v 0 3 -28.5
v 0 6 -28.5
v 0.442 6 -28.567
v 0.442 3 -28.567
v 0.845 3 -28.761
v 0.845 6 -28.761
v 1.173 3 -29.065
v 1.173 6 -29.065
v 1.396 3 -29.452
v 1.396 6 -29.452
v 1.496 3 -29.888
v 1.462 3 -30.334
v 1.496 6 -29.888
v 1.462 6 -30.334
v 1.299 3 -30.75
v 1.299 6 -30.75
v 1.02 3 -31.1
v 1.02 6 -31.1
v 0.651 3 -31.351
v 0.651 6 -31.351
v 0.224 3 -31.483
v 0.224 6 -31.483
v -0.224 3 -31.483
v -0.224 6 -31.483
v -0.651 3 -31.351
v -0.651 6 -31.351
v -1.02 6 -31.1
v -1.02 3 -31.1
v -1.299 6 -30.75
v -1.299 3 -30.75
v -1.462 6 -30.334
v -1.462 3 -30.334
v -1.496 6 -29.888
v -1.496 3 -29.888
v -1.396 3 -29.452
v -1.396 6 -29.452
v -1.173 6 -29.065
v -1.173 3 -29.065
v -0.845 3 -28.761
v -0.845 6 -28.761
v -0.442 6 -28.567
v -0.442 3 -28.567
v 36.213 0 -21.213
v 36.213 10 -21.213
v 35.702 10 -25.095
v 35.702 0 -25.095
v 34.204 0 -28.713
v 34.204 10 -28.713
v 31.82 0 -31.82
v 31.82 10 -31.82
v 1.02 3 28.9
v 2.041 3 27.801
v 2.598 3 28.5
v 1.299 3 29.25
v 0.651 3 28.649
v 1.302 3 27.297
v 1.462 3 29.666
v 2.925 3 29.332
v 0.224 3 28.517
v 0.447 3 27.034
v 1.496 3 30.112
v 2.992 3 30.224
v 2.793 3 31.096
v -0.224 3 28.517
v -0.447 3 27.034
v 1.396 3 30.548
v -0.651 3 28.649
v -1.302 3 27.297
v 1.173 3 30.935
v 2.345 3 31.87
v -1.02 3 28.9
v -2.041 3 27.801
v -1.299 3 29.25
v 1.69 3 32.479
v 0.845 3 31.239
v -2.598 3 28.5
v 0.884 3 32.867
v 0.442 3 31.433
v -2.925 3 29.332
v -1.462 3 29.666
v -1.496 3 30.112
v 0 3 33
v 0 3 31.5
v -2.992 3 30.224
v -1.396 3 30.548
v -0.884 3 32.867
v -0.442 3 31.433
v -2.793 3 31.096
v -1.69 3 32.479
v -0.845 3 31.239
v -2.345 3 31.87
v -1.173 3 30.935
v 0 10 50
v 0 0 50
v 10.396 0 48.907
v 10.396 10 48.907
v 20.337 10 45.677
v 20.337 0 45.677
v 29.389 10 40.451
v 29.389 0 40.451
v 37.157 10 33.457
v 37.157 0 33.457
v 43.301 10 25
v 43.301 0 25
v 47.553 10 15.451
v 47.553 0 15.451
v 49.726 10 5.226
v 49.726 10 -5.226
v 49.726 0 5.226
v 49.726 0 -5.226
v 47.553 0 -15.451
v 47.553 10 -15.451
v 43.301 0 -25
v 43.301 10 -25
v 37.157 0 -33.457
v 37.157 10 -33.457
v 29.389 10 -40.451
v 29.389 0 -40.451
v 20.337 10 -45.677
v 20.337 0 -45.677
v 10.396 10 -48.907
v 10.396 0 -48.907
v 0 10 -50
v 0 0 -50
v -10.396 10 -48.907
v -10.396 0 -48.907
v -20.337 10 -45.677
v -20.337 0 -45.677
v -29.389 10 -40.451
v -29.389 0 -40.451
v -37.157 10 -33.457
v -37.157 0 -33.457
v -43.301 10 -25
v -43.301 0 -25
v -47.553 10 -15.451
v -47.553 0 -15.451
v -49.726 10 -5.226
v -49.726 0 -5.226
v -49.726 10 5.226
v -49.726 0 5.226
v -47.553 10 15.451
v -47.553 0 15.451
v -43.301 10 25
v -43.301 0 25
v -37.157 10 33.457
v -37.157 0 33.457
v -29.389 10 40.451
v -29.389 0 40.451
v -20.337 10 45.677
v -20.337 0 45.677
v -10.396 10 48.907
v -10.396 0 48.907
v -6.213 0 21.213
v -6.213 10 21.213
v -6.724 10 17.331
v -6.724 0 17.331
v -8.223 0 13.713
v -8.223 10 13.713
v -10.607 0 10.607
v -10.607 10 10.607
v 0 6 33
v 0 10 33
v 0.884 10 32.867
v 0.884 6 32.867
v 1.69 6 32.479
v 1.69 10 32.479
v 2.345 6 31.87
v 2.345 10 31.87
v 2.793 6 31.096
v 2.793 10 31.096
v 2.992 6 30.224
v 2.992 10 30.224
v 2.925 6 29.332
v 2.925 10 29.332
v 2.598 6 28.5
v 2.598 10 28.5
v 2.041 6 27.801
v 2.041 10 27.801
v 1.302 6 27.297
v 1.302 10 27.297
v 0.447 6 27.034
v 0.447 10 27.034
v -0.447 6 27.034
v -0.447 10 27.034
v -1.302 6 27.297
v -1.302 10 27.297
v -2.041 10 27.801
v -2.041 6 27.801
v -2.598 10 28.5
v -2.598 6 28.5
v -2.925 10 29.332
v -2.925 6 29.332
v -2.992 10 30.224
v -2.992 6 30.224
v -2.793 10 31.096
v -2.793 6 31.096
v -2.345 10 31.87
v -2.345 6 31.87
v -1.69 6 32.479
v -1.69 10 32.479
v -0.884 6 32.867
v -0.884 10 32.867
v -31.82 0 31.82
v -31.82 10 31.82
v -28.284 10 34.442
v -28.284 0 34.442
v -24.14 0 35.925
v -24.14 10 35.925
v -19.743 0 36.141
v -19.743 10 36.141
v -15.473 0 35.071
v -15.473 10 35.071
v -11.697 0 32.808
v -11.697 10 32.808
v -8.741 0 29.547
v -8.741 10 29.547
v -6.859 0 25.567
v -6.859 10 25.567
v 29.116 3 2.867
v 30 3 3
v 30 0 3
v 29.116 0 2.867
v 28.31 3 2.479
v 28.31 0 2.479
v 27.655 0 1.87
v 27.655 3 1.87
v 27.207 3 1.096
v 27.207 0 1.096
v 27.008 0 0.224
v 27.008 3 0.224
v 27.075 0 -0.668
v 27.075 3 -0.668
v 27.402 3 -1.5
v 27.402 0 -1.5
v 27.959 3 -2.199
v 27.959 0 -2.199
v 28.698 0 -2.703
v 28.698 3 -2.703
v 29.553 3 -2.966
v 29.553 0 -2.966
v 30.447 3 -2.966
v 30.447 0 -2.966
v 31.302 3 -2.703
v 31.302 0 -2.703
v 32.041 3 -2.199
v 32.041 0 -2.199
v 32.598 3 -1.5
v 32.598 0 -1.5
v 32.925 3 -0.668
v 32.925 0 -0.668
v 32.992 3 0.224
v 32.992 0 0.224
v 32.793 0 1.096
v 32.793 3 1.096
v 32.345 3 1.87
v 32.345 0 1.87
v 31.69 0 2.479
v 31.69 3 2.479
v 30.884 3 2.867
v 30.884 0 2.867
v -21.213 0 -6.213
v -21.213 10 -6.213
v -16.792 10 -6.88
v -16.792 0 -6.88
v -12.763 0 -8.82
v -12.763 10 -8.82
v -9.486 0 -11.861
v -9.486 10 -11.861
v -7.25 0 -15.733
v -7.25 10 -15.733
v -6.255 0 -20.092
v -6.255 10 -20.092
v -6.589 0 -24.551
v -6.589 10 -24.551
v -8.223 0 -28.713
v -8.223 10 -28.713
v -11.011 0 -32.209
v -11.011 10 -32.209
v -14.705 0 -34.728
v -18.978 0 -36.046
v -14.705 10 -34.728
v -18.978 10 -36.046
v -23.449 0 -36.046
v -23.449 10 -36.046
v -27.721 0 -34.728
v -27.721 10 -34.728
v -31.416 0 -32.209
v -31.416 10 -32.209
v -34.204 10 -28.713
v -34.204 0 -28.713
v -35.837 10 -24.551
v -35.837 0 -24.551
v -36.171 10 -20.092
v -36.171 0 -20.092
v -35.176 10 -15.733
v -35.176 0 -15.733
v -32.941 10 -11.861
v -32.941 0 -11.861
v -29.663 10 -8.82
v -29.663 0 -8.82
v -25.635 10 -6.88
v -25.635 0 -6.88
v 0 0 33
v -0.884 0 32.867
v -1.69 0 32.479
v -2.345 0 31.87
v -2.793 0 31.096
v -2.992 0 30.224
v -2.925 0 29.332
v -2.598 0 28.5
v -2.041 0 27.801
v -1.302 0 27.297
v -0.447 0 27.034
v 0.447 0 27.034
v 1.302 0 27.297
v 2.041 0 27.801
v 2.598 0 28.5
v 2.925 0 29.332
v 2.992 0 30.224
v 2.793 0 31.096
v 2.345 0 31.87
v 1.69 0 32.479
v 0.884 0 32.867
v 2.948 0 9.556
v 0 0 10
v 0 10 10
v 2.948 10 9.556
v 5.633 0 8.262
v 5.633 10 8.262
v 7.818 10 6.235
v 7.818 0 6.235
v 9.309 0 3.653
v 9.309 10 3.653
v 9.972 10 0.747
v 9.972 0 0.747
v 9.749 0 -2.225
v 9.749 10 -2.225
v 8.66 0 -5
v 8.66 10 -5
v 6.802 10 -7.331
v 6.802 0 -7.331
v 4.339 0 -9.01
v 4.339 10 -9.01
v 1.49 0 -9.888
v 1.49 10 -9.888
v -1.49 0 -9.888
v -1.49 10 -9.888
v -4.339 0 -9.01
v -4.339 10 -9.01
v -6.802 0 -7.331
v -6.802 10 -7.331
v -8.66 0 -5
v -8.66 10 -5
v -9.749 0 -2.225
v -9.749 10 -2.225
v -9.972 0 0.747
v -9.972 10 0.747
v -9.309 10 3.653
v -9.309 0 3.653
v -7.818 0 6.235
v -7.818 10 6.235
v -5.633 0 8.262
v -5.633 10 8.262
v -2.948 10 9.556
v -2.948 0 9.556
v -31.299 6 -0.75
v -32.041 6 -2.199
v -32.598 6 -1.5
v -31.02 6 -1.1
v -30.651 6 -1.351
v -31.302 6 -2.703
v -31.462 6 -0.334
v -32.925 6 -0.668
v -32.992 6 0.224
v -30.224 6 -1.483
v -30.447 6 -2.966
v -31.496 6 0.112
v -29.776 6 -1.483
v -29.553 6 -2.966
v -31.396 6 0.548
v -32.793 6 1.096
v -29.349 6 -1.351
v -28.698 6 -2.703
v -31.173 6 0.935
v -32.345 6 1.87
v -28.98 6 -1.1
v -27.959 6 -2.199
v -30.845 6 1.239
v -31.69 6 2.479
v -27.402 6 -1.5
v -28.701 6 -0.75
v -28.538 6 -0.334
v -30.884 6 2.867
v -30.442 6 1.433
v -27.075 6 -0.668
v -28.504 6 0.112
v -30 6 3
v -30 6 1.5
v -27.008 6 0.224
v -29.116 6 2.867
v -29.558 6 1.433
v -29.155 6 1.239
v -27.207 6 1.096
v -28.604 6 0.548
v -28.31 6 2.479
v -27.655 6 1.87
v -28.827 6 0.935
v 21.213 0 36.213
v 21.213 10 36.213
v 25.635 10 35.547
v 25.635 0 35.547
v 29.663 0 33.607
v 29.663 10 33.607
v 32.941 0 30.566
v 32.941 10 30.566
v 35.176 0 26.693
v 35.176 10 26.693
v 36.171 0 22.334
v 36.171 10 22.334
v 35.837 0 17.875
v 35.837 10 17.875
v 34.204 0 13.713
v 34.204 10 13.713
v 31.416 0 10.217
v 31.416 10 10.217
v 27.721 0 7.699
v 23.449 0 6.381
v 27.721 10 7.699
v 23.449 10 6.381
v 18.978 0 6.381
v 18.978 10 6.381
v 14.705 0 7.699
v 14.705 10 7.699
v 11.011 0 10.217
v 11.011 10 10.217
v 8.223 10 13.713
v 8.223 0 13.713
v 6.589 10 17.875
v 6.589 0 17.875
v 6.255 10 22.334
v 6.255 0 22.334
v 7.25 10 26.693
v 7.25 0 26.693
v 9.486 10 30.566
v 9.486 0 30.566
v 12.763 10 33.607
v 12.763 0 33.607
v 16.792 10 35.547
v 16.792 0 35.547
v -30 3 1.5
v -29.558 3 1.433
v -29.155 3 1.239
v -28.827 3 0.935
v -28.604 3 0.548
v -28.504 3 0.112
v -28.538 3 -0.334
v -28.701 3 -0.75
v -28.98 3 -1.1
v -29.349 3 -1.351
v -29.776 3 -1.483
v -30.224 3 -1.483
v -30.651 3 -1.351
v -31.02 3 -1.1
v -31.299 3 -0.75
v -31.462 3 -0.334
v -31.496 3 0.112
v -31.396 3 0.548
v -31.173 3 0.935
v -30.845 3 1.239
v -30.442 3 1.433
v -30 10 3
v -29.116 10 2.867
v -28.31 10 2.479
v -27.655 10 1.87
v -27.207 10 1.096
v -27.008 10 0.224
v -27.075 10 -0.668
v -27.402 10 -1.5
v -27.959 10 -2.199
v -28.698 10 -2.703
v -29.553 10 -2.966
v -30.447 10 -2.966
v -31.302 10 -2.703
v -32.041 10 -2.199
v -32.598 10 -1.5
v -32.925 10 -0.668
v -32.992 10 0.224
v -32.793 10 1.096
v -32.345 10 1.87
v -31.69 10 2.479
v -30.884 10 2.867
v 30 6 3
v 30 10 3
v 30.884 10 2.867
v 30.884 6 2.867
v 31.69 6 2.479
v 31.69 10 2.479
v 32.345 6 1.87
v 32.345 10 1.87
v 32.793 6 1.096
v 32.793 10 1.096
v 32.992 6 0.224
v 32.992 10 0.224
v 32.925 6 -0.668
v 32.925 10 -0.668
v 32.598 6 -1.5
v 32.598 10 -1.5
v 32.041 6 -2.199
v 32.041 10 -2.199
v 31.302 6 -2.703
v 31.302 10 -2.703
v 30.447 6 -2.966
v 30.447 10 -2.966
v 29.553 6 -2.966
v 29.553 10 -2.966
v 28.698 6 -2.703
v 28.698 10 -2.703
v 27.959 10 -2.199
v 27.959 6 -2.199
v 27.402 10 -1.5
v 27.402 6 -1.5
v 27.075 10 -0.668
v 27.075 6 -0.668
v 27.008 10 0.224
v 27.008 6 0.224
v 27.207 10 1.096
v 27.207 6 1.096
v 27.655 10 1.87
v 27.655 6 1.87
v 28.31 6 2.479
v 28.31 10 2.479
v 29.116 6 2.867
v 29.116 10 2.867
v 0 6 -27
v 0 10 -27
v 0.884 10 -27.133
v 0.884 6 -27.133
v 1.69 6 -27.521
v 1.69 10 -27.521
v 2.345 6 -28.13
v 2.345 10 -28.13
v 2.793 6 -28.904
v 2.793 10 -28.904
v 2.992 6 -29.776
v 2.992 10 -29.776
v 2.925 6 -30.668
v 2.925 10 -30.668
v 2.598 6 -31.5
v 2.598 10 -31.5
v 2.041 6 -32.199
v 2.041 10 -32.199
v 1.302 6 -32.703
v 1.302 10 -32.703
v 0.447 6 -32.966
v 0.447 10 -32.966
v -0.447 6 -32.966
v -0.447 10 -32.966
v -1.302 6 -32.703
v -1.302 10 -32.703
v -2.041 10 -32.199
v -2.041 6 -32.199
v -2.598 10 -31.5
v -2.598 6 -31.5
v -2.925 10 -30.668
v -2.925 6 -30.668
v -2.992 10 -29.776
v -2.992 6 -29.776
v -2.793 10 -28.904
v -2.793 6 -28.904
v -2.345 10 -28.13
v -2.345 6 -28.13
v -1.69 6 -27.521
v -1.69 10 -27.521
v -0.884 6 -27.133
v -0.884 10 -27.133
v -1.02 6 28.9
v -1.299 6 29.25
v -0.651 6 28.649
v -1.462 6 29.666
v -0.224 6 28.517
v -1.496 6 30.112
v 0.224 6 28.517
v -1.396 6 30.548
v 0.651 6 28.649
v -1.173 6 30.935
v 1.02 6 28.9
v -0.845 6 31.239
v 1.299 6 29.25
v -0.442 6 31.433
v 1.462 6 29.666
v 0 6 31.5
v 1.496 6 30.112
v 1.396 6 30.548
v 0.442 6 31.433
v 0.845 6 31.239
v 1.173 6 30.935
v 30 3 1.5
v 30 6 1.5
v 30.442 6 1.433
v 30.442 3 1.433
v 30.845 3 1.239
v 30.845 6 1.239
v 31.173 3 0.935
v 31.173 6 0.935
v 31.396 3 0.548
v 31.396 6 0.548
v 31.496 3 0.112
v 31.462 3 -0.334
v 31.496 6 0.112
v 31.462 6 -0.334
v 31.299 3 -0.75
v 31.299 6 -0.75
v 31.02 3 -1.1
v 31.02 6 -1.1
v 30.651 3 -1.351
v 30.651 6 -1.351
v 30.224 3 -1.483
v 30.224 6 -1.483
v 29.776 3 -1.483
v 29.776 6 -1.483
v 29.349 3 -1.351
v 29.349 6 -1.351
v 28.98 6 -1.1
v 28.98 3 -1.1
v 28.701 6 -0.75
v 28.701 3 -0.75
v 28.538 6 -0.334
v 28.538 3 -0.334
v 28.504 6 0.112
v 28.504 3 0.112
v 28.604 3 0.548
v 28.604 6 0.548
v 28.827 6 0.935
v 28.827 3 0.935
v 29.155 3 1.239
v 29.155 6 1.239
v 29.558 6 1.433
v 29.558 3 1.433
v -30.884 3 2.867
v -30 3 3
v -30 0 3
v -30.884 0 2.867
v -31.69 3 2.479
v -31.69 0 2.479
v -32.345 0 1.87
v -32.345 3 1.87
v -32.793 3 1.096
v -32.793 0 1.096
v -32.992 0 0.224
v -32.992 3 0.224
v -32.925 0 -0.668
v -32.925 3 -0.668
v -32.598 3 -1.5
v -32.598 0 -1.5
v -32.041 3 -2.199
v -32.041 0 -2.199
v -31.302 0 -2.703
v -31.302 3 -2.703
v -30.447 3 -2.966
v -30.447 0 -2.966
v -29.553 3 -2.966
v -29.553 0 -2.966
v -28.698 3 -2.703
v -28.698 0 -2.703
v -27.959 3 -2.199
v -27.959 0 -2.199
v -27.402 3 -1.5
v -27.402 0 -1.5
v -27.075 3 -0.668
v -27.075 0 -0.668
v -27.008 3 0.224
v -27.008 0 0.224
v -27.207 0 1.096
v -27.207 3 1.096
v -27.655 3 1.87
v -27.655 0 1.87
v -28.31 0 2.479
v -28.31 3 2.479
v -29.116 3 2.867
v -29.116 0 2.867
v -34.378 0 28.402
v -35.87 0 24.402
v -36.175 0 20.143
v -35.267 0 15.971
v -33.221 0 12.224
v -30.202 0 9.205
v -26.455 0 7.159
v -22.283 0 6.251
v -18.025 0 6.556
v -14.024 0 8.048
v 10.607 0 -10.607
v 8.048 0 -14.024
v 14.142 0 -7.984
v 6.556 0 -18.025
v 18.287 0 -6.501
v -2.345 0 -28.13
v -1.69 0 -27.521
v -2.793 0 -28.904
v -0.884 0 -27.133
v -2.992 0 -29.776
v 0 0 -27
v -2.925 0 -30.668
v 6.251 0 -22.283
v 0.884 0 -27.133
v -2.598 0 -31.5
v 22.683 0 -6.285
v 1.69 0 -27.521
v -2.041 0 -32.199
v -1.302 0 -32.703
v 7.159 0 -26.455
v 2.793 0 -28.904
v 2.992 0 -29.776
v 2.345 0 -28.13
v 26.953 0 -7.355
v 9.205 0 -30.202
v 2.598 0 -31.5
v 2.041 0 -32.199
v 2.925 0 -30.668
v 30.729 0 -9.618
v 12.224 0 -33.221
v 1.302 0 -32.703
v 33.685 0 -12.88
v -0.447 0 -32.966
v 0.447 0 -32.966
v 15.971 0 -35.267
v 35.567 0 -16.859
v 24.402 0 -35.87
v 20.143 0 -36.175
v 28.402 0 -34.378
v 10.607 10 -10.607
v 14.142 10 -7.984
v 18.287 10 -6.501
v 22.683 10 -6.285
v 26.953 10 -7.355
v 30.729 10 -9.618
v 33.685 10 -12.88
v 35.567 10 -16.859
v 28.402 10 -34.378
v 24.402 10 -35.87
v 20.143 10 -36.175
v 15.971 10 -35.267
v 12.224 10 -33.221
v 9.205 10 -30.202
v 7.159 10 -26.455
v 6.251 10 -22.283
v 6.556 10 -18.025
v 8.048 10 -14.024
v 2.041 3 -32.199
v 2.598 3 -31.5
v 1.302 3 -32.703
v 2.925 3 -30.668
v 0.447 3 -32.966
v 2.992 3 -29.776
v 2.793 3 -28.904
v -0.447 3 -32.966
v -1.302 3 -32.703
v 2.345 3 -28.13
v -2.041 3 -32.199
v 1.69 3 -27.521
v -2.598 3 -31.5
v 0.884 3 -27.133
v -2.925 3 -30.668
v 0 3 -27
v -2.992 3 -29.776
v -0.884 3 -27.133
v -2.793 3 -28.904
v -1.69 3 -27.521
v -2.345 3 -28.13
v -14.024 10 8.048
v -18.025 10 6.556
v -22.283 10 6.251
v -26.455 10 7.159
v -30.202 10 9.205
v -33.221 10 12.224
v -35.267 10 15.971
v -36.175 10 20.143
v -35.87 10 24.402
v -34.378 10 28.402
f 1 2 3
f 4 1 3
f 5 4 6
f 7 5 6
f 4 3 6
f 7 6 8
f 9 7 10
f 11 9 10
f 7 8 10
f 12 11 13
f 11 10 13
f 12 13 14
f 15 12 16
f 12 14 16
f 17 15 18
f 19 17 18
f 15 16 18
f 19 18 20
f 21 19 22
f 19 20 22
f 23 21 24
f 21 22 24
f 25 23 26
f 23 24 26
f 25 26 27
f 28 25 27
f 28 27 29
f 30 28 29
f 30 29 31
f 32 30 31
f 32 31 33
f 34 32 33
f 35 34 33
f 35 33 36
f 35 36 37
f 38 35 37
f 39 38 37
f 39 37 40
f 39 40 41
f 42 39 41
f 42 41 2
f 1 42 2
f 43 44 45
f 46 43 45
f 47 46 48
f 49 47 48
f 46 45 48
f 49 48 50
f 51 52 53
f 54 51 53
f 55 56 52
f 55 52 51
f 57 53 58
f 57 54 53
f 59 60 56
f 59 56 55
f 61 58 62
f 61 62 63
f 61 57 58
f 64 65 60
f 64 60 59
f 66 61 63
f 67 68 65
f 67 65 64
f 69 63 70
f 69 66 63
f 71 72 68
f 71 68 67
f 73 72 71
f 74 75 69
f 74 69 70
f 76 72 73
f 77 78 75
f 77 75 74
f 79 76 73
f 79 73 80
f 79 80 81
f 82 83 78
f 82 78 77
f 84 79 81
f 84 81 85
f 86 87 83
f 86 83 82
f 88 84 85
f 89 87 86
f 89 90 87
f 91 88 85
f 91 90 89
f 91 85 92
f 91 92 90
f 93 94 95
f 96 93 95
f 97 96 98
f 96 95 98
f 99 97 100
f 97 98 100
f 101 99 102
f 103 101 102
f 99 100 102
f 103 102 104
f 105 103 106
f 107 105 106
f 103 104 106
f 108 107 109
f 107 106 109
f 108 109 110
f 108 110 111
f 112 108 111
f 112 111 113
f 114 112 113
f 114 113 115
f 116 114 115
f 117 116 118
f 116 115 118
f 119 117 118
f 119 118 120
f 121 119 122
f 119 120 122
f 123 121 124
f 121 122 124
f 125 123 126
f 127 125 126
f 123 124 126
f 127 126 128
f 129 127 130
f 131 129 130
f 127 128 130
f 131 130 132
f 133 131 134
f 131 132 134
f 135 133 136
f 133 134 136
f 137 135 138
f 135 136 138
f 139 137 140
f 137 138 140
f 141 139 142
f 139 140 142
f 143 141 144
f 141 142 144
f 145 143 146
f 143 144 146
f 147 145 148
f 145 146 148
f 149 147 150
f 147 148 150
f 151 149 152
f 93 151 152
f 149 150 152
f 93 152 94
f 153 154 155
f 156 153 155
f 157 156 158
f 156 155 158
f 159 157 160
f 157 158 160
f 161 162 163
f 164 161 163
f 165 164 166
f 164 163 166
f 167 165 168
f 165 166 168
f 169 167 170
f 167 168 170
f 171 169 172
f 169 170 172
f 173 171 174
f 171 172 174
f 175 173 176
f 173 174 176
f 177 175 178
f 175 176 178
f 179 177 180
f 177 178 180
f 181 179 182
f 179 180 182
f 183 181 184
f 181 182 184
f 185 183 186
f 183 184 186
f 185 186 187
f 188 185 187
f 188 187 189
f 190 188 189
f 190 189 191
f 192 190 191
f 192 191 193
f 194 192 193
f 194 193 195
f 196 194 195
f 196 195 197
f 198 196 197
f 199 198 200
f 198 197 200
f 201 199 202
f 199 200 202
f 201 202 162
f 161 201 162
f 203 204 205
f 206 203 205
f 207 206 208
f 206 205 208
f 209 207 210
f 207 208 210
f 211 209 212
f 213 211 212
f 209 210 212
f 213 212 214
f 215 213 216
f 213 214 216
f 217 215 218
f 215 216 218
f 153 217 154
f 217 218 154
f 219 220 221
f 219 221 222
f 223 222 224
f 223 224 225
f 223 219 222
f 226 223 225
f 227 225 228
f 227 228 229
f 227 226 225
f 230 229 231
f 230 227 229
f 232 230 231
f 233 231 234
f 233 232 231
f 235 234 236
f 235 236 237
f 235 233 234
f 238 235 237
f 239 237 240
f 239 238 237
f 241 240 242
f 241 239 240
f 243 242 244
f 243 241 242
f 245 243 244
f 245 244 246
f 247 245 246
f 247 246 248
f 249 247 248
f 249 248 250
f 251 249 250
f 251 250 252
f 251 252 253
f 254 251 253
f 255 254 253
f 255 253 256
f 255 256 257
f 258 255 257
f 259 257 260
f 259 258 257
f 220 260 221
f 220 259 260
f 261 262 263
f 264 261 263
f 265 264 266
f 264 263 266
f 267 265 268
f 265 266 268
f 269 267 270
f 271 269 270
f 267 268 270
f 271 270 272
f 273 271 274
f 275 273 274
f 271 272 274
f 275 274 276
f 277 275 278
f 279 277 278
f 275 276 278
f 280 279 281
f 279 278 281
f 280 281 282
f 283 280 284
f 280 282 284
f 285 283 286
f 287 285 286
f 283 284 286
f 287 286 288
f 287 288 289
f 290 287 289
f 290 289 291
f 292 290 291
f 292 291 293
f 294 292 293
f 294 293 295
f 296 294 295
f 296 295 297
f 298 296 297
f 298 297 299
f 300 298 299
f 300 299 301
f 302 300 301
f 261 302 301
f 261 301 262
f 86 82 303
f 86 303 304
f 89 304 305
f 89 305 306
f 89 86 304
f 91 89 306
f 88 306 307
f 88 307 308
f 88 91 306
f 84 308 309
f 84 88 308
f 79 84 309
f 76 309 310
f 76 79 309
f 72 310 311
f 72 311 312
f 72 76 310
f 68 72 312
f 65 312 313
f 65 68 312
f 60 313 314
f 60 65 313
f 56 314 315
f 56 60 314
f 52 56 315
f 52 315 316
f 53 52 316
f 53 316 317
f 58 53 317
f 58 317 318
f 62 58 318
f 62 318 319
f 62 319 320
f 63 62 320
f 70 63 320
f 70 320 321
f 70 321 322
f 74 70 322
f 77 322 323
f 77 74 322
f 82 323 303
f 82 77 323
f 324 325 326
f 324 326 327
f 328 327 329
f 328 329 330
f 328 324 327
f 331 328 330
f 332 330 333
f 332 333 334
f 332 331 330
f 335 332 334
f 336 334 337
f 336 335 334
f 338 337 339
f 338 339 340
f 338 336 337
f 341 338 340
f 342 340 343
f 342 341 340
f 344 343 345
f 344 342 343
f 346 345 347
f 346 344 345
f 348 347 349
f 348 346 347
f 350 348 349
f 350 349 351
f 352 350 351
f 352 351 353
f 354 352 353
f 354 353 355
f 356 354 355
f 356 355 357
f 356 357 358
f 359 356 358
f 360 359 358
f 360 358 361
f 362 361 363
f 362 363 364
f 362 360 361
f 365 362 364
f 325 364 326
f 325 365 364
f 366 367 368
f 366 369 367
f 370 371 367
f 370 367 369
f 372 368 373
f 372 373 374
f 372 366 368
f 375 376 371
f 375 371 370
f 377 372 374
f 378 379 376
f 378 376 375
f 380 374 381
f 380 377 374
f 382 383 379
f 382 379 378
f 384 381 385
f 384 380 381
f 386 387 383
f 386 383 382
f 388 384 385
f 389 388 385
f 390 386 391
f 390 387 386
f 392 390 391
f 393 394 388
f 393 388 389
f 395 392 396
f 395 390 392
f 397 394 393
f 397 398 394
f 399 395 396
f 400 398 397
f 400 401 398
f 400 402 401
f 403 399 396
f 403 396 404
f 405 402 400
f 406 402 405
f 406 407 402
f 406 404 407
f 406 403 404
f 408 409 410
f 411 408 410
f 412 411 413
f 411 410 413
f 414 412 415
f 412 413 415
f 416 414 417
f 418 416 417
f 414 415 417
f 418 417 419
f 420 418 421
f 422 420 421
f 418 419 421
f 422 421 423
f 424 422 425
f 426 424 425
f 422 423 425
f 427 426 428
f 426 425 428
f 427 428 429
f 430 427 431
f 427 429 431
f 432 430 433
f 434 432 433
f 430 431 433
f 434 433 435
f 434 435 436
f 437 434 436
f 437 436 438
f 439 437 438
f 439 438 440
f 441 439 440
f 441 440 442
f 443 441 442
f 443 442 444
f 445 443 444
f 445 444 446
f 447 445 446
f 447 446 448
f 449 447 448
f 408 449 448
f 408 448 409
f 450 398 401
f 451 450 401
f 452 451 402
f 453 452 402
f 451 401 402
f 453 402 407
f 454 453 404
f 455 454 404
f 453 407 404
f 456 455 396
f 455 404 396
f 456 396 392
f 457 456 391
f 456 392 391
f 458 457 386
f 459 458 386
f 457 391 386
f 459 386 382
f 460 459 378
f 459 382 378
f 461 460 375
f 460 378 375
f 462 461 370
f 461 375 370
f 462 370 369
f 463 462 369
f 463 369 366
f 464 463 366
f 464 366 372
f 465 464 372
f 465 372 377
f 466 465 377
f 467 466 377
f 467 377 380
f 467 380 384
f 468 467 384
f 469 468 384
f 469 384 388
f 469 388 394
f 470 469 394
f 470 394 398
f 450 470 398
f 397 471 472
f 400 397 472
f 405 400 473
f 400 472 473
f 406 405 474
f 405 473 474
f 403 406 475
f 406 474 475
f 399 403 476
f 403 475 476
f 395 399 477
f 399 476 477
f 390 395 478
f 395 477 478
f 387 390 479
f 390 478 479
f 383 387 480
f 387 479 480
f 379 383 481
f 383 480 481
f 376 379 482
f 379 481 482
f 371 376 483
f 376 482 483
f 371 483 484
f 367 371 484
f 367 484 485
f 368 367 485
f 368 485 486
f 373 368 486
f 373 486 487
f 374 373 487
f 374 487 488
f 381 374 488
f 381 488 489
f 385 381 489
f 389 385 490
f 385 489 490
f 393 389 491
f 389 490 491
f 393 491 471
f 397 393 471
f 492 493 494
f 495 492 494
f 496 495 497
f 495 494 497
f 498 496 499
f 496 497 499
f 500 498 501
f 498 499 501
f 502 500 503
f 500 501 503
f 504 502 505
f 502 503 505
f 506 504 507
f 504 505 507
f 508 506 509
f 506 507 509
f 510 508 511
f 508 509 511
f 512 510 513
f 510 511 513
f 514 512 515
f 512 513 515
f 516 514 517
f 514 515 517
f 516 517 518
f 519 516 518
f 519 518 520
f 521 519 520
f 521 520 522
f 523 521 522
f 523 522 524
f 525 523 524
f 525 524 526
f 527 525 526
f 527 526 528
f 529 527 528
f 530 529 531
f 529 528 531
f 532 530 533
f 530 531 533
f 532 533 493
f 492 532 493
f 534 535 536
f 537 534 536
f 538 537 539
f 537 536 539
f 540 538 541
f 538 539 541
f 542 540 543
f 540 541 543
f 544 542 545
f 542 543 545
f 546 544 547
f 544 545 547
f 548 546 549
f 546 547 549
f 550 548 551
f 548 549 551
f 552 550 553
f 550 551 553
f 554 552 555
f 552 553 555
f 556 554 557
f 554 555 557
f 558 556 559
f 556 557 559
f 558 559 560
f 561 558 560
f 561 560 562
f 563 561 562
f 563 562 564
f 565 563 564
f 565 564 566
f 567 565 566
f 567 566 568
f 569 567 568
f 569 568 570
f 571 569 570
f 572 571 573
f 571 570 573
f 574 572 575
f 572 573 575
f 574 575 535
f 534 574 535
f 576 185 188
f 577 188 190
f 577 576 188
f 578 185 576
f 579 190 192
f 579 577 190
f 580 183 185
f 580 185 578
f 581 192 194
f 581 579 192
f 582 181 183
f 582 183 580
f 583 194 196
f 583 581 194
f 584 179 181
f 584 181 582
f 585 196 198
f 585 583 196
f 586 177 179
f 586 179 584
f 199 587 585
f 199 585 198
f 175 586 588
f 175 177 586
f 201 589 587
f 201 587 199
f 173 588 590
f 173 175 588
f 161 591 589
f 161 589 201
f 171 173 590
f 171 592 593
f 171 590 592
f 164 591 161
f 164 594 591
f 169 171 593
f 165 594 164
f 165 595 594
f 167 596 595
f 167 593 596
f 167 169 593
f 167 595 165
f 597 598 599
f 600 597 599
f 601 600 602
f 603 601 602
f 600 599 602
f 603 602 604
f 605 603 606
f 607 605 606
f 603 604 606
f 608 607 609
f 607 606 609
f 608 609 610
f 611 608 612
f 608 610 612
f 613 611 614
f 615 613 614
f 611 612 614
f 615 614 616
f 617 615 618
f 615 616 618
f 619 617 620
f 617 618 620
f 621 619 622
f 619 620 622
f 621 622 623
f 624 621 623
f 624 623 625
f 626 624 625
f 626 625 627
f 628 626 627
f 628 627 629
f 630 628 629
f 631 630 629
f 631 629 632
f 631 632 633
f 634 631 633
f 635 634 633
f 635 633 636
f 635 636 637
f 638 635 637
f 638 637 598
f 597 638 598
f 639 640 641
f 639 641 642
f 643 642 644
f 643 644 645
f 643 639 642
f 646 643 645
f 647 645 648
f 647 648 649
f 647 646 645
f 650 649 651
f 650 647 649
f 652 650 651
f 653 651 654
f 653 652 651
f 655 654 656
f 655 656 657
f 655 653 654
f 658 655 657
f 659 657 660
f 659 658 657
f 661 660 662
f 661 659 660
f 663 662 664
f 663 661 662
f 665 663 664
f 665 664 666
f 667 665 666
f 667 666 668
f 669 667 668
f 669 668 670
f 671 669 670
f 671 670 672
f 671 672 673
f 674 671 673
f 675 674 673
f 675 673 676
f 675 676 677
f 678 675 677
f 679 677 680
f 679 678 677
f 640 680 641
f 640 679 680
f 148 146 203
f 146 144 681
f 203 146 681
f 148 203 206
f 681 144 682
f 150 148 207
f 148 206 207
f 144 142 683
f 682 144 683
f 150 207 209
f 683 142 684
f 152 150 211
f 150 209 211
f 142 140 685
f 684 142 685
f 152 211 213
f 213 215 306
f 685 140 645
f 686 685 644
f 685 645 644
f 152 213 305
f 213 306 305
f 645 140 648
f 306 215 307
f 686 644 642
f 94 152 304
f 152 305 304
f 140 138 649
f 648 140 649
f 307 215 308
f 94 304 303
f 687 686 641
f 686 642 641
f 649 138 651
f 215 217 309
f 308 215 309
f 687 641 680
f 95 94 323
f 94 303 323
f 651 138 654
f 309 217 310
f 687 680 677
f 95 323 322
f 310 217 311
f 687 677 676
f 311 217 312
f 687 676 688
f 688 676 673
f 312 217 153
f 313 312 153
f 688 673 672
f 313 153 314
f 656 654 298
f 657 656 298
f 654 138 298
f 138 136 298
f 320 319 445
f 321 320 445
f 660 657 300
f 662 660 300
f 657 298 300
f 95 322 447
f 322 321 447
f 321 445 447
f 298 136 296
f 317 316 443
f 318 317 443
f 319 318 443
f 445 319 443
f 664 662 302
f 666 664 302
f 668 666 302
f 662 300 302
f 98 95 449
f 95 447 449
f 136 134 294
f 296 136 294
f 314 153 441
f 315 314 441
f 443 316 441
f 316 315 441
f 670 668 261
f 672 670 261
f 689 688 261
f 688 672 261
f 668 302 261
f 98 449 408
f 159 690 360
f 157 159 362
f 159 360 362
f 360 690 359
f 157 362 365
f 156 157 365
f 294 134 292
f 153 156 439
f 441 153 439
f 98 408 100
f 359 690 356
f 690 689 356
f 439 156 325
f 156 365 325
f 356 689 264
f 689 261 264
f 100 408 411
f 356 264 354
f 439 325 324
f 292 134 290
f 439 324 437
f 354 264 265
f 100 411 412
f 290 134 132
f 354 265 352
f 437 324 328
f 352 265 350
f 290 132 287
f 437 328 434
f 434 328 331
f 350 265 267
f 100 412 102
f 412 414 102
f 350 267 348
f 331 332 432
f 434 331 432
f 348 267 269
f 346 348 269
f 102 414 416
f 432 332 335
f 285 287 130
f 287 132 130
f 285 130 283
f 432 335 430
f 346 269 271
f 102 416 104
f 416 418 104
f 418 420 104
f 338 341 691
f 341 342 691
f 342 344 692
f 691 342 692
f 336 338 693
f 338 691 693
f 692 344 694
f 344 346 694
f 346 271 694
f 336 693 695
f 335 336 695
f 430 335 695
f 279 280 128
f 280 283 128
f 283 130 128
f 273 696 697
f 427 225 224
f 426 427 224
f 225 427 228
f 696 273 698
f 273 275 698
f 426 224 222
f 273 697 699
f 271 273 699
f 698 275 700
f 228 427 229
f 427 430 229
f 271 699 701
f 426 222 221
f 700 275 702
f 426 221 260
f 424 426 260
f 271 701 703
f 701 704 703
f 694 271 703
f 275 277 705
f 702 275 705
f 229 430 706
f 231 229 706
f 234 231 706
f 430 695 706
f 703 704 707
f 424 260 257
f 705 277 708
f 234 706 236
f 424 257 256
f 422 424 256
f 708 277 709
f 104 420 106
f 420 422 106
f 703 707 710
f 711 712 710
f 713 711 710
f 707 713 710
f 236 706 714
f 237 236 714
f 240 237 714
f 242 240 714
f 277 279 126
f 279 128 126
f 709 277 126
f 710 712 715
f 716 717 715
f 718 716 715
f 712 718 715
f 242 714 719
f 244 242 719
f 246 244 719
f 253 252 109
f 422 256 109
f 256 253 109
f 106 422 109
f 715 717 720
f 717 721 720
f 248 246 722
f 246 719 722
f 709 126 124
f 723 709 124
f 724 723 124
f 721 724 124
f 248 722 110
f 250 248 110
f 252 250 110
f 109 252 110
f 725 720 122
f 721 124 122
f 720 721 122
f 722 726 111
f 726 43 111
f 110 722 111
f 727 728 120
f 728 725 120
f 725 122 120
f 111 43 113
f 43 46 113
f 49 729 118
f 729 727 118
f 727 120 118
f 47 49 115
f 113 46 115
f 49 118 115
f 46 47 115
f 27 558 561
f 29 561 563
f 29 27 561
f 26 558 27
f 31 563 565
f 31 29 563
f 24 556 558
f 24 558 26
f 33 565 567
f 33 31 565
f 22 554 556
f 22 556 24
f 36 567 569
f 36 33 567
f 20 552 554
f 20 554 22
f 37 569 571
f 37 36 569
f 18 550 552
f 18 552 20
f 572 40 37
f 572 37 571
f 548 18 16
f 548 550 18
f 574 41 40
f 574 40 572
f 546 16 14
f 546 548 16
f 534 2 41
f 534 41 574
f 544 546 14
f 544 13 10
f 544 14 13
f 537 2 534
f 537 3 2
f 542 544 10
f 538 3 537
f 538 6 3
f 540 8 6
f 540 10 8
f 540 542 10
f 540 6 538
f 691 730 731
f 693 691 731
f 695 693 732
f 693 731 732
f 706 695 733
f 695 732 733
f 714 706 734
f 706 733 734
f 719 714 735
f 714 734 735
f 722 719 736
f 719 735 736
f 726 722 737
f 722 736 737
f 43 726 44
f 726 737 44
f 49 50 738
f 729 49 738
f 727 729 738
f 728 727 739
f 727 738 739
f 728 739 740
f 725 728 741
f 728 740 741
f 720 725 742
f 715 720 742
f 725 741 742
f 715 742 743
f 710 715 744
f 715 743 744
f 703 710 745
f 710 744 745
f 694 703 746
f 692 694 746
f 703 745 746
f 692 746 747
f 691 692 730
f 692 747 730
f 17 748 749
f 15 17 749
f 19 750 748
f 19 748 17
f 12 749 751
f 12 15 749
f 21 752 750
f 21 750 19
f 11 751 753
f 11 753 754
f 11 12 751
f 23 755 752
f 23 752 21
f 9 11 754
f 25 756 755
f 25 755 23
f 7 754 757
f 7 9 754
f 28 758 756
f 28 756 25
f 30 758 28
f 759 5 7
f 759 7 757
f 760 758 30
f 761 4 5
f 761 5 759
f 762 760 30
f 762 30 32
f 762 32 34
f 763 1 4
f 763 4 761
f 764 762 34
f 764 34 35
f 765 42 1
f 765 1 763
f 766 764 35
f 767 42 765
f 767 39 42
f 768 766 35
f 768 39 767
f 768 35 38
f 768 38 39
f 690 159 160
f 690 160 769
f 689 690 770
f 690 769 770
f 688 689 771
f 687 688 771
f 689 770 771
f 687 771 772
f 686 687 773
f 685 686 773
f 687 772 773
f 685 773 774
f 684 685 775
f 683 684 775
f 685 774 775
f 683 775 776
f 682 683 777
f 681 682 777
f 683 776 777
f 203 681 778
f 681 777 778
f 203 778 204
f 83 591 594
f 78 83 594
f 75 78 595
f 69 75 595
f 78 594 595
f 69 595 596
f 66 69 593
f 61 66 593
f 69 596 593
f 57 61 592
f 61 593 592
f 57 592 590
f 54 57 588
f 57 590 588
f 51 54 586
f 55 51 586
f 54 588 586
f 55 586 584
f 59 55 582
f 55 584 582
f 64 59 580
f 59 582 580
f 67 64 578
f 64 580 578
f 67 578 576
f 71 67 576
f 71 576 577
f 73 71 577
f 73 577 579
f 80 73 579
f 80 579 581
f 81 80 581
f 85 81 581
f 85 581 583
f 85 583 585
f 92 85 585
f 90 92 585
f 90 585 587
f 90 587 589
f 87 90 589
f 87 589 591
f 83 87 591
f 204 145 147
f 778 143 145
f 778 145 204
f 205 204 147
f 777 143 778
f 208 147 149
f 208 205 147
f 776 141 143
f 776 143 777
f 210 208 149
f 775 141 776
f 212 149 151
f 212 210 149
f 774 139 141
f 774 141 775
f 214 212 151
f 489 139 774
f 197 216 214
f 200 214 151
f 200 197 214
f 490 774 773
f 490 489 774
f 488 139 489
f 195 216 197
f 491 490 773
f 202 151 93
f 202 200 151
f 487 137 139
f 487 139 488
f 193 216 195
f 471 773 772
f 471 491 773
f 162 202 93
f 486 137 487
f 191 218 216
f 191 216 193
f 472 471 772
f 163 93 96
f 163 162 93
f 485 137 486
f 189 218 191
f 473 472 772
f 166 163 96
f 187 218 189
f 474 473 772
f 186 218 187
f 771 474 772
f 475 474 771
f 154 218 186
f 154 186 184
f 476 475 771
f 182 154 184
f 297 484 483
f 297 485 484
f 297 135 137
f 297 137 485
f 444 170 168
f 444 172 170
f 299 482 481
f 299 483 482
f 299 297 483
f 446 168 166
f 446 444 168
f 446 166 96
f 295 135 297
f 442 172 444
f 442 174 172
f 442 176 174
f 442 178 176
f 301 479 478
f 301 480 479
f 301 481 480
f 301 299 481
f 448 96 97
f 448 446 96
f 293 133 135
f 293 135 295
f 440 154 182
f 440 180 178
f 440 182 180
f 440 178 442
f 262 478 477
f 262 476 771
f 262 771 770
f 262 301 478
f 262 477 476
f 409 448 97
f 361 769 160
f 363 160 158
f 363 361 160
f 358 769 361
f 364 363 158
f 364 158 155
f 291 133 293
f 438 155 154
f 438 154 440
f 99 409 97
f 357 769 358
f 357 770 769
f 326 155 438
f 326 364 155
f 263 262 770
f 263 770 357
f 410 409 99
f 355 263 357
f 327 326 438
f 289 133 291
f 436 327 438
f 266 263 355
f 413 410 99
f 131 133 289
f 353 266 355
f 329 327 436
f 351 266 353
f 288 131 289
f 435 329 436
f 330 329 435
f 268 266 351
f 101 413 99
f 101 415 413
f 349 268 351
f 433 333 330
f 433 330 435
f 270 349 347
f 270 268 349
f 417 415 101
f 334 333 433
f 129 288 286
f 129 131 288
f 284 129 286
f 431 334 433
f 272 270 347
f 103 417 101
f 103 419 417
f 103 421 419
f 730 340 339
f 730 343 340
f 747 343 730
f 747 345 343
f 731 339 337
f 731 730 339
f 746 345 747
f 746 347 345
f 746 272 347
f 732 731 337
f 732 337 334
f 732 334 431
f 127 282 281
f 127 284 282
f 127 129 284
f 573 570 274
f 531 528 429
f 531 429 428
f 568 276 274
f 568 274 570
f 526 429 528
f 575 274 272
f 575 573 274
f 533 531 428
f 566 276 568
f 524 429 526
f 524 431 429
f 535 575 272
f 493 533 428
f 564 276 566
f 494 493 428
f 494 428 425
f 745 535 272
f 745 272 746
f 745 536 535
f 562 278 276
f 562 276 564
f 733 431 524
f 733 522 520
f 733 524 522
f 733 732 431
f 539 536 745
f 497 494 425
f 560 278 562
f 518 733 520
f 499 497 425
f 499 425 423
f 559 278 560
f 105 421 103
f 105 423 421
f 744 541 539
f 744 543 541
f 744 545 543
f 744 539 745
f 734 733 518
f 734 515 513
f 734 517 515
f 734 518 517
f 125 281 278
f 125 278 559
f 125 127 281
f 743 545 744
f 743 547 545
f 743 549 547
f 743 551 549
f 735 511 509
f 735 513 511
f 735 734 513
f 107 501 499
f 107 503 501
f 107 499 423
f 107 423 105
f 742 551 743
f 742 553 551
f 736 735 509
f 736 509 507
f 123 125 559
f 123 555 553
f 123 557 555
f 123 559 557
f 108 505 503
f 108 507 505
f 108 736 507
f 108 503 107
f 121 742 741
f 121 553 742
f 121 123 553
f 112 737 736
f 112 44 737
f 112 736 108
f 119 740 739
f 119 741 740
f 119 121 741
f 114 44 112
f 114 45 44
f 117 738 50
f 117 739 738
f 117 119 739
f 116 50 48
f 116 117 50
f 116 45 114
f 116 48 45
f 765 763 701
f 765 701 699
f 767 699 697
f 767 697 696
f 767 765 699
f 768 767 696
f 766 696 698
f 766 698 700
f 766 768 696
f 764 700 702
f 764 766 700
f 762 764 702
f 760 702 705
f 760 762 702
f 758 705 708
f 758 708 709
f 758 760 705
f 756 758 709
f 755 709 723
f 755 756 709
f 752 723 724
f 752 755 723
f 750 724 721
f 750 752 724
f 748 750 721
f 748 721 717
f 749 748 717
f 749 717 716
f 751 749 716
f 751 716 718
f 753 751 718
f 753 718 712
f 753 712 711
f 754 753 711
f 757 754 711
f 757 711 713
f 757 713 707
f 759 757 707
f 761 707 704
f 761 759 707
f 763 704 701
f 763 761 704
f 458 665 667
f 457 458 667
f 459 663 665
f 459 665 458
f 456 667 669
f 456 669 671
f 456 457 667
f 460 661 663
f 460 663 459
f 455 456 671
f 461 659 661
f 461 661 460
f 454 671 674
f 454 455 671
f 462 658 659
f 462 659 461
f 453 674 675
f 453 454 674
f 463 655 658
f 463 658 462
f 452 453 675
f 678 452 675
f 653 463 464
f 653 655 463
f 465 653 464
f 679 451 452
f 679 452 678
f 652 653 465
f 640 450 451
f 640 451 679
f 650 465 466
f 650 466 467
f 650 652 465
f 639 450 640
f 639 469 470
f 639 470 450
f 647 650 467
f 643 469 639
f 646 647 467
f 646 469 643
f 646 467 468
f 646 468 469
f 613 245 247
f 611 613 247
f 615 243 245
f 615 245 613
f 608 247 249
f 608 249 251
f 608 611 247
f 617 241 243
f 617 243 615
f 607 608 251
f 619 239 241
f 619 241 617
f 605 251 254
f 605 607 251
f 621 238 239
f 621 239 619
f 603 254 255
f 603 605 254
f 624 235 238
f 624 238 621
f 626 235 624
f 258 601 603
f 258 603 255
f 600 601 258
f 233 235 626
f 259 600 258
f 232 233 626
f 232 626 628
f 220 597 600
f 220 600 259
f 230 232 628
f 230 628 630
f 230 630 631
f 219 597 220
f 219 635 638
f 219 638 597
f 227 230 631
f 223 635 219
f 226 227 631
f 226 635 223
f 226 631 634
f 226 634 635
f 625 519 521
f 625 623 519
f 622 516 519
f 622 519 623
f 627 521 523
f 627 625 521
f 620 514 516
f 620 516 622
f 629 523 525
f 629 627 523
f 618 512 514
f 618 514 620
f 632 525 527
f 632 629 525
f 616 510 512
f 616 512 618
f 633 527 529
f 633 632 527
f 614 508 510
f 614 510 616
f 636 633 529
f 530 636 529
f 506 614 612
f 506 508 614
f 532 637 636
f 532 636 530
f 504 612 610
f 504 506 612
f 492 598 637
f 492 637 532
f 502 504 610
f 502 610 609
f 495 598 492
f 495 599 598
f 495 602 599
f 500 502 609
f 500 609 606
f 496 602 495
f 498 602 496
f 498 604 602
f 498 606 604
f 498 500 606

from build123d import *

# Parameters (mm, degrees)
SKETCH_2_R          = 50
SKETCH_2_R_2        = 30
SKETCH_2_R_3        = 10
EXTRUDE_1_DEPTH     = 10
SKETCH_3_R          = 3
CUT_EXTRUDE_1_DEPTH = 4
SKETCH_4_R          = 1.5
CUT_EXTRUDE_2_DEPTH = 71.964779997
CUT_EXTRUDE_START   = -3
SKETCH_5_R          = 3
CUT_EXTRUDE_3_DEPTH = 3
SKETCH_6_R          = 15
CUT_EXTRUDE_5_DEPTH = 72.414284285


with BuildPart() as part:
    # 草图2 → 凸台-拉伸1 (new body)
    # profile 1 of 2: a face of its own
    with BuildSketch(Plane(origin=(0, 0, 0), x_dir=(1, 0, 0), z_dir=(0, 1, 0))):
        with Locations(Location((0, 0, 0), (0, 0, 270))):
            Circle(SKETCH_2_R)
        Circle(SKETCH_2_R_2, mode=Mode.SUBTRACT)
    # profile 2 of 2: a face of its own
    with BuildSketch(Plane(origin=(0, 0, 0), x_dir=(1, 0, 0), z_dir=(0, 1, 0))):
        Circle(SKETCH_2_R_2)
        with Locations(Location((0, 0, 0), (0, 0, 270))):
            Circle(SKETCH_2_R_3, mode=Mode.SUBTRACT)
    extrude(amount=EXTRUDE_1_DEPTH)

    # 草图3 → 切除-拉伸1 (cut)
    with BuildSketch(Plane(origin=(0, 10, 0), x_dir=(1, 0, 0), z_dir=(0, 1, 0))):
        with Locations(Location((0, 30, 0), (0, 0, 270))):
            Circle(SKETCH_3_R)
        with Locations(Location((30, 0, 0), (0, 0, 270))):
            Circle(SKETCH_3_R)
        with Locations(Location((0, -30, 0), (0, 0, 270))):
            Circle(SKETCH_3_R)
        with Locations(Location((-30, 0, 0), (0, 0, 270))):
            Circle(SKETCH_3_R)
    extrude(amount=-CUT_EXTRUDE_1_DEPTH, mode=Mode.SUBTRACT)

    # 草图4 → 切除-拉伸2 (cut, through all)
    with BuildSketch(Plane(origin=(0, 6, 0), x_dir=(1, 0, 0), z_dir=(0, 1, 0))):
        with Locations(Location((0, 30, 0), (0, 0, 270))):
            Circle(SKETCH_4_R)
        with Locations(Location((30, 0, 0), (0, 0, 270))):
            Circle(SKETCH_4_R)
        with Locations(Location((0, -30, 0), (0, 0, 270))):
            Circle(SKETCH_4_R)
        with Locations(Location((-30, 0, 0), (0, 0, 270))):
            Circle(SKETCH_4_R)
    extrude(amount=-CUT_EXTRUDE_2_DEPTH, mode=Mode.SUBTRACT)

    # 草图5 → 切除-拉伸3 (cut)
    with BuildSketch(Plane.XZ.offset(CUT_EXTRUDE_START)):
        with Locations(Location((0, 30, 0), (0, 0, 90))):
            Circle(SKETCH_5_R)
        with Locations(Location((30, 0, 0), (0, 0, 90))):
            Circle(SKETCH_5_R)
        with Locations(Location((0, -30, 0), (0, 0, 90))):
            Circle(SKETCH_5_R)
        with Locations(Location((-30, 0, 0), (0, 0, 90))):
            Circle(SKETCH_5_R)
    extrude(amount=CUT_EXTRUDE_3_DEPTH, mode=Mode.SUBTRACT)

    # 草图6 → 切除-拉伸5 (cut, through all)
    with BuildSketch(Plane(origin=(0, 10, 0), x_dir=(1, 0, 0), z_dir=(0, 1, 0))):
        with Locations(Location((-21.213203436, 21.213203436, 0), (0, 0, 270))):
            Circle(SKETCH_6_R)
        with BuildLine():
            ThreePointArc((36.213203436, 21.213203436), (35.071396428, 26.953454911), (31.819805169, 31.819805138))
            Line((31.819805153, 31.819805153), (10.606601718, 10.606601718))
            ThreePointArc((10.606601715, 10.606601721), (26.953454919, 7.355010447), (36.213203436, 21.213203436))
        make_face()
        with BuildLine():
            Line((10.606601718, 10.606601718), (31.819805153, 31.819805153))
            ThreePointArc((31.819805169, 31.819805138), (10.606601727, 31.819805163), (10.606601715, 10.606601721))
        make_face()
        with Locations(Location((21.213203436, -21.213203436, 0), (0, 0, 270))):
            Circle(SKETCH_6_R)
        with BuildLine():
            ThreePointArc((-10.60660172, -10.606601716), (-31.819805167, -10.606601732), (-31.819805128, -31.819805179))
            Line((-31.819805153, -31.819805153), (-10.606601718, -10.606601718))
        make_face()
        with BuildLine():
            Line((-10.606601718, -10.606601718), (-31.819805153, -31.819805153))
            ThreePointArc((-31.819805128, -31.819805179), (-15.472951933, -35.071396416), (-6.213203436, -21.213203436))
            ThreePointArc((-6.213203436, -21.213203436), (-7.355010448, -15.472951949), (-10.60660172, -10.606601716))
        make_face()
    extrude(amount=-CUT_EXTRUDE_5_DEPTH, mode=Mode.SUBTRACT)


solid = part.part
